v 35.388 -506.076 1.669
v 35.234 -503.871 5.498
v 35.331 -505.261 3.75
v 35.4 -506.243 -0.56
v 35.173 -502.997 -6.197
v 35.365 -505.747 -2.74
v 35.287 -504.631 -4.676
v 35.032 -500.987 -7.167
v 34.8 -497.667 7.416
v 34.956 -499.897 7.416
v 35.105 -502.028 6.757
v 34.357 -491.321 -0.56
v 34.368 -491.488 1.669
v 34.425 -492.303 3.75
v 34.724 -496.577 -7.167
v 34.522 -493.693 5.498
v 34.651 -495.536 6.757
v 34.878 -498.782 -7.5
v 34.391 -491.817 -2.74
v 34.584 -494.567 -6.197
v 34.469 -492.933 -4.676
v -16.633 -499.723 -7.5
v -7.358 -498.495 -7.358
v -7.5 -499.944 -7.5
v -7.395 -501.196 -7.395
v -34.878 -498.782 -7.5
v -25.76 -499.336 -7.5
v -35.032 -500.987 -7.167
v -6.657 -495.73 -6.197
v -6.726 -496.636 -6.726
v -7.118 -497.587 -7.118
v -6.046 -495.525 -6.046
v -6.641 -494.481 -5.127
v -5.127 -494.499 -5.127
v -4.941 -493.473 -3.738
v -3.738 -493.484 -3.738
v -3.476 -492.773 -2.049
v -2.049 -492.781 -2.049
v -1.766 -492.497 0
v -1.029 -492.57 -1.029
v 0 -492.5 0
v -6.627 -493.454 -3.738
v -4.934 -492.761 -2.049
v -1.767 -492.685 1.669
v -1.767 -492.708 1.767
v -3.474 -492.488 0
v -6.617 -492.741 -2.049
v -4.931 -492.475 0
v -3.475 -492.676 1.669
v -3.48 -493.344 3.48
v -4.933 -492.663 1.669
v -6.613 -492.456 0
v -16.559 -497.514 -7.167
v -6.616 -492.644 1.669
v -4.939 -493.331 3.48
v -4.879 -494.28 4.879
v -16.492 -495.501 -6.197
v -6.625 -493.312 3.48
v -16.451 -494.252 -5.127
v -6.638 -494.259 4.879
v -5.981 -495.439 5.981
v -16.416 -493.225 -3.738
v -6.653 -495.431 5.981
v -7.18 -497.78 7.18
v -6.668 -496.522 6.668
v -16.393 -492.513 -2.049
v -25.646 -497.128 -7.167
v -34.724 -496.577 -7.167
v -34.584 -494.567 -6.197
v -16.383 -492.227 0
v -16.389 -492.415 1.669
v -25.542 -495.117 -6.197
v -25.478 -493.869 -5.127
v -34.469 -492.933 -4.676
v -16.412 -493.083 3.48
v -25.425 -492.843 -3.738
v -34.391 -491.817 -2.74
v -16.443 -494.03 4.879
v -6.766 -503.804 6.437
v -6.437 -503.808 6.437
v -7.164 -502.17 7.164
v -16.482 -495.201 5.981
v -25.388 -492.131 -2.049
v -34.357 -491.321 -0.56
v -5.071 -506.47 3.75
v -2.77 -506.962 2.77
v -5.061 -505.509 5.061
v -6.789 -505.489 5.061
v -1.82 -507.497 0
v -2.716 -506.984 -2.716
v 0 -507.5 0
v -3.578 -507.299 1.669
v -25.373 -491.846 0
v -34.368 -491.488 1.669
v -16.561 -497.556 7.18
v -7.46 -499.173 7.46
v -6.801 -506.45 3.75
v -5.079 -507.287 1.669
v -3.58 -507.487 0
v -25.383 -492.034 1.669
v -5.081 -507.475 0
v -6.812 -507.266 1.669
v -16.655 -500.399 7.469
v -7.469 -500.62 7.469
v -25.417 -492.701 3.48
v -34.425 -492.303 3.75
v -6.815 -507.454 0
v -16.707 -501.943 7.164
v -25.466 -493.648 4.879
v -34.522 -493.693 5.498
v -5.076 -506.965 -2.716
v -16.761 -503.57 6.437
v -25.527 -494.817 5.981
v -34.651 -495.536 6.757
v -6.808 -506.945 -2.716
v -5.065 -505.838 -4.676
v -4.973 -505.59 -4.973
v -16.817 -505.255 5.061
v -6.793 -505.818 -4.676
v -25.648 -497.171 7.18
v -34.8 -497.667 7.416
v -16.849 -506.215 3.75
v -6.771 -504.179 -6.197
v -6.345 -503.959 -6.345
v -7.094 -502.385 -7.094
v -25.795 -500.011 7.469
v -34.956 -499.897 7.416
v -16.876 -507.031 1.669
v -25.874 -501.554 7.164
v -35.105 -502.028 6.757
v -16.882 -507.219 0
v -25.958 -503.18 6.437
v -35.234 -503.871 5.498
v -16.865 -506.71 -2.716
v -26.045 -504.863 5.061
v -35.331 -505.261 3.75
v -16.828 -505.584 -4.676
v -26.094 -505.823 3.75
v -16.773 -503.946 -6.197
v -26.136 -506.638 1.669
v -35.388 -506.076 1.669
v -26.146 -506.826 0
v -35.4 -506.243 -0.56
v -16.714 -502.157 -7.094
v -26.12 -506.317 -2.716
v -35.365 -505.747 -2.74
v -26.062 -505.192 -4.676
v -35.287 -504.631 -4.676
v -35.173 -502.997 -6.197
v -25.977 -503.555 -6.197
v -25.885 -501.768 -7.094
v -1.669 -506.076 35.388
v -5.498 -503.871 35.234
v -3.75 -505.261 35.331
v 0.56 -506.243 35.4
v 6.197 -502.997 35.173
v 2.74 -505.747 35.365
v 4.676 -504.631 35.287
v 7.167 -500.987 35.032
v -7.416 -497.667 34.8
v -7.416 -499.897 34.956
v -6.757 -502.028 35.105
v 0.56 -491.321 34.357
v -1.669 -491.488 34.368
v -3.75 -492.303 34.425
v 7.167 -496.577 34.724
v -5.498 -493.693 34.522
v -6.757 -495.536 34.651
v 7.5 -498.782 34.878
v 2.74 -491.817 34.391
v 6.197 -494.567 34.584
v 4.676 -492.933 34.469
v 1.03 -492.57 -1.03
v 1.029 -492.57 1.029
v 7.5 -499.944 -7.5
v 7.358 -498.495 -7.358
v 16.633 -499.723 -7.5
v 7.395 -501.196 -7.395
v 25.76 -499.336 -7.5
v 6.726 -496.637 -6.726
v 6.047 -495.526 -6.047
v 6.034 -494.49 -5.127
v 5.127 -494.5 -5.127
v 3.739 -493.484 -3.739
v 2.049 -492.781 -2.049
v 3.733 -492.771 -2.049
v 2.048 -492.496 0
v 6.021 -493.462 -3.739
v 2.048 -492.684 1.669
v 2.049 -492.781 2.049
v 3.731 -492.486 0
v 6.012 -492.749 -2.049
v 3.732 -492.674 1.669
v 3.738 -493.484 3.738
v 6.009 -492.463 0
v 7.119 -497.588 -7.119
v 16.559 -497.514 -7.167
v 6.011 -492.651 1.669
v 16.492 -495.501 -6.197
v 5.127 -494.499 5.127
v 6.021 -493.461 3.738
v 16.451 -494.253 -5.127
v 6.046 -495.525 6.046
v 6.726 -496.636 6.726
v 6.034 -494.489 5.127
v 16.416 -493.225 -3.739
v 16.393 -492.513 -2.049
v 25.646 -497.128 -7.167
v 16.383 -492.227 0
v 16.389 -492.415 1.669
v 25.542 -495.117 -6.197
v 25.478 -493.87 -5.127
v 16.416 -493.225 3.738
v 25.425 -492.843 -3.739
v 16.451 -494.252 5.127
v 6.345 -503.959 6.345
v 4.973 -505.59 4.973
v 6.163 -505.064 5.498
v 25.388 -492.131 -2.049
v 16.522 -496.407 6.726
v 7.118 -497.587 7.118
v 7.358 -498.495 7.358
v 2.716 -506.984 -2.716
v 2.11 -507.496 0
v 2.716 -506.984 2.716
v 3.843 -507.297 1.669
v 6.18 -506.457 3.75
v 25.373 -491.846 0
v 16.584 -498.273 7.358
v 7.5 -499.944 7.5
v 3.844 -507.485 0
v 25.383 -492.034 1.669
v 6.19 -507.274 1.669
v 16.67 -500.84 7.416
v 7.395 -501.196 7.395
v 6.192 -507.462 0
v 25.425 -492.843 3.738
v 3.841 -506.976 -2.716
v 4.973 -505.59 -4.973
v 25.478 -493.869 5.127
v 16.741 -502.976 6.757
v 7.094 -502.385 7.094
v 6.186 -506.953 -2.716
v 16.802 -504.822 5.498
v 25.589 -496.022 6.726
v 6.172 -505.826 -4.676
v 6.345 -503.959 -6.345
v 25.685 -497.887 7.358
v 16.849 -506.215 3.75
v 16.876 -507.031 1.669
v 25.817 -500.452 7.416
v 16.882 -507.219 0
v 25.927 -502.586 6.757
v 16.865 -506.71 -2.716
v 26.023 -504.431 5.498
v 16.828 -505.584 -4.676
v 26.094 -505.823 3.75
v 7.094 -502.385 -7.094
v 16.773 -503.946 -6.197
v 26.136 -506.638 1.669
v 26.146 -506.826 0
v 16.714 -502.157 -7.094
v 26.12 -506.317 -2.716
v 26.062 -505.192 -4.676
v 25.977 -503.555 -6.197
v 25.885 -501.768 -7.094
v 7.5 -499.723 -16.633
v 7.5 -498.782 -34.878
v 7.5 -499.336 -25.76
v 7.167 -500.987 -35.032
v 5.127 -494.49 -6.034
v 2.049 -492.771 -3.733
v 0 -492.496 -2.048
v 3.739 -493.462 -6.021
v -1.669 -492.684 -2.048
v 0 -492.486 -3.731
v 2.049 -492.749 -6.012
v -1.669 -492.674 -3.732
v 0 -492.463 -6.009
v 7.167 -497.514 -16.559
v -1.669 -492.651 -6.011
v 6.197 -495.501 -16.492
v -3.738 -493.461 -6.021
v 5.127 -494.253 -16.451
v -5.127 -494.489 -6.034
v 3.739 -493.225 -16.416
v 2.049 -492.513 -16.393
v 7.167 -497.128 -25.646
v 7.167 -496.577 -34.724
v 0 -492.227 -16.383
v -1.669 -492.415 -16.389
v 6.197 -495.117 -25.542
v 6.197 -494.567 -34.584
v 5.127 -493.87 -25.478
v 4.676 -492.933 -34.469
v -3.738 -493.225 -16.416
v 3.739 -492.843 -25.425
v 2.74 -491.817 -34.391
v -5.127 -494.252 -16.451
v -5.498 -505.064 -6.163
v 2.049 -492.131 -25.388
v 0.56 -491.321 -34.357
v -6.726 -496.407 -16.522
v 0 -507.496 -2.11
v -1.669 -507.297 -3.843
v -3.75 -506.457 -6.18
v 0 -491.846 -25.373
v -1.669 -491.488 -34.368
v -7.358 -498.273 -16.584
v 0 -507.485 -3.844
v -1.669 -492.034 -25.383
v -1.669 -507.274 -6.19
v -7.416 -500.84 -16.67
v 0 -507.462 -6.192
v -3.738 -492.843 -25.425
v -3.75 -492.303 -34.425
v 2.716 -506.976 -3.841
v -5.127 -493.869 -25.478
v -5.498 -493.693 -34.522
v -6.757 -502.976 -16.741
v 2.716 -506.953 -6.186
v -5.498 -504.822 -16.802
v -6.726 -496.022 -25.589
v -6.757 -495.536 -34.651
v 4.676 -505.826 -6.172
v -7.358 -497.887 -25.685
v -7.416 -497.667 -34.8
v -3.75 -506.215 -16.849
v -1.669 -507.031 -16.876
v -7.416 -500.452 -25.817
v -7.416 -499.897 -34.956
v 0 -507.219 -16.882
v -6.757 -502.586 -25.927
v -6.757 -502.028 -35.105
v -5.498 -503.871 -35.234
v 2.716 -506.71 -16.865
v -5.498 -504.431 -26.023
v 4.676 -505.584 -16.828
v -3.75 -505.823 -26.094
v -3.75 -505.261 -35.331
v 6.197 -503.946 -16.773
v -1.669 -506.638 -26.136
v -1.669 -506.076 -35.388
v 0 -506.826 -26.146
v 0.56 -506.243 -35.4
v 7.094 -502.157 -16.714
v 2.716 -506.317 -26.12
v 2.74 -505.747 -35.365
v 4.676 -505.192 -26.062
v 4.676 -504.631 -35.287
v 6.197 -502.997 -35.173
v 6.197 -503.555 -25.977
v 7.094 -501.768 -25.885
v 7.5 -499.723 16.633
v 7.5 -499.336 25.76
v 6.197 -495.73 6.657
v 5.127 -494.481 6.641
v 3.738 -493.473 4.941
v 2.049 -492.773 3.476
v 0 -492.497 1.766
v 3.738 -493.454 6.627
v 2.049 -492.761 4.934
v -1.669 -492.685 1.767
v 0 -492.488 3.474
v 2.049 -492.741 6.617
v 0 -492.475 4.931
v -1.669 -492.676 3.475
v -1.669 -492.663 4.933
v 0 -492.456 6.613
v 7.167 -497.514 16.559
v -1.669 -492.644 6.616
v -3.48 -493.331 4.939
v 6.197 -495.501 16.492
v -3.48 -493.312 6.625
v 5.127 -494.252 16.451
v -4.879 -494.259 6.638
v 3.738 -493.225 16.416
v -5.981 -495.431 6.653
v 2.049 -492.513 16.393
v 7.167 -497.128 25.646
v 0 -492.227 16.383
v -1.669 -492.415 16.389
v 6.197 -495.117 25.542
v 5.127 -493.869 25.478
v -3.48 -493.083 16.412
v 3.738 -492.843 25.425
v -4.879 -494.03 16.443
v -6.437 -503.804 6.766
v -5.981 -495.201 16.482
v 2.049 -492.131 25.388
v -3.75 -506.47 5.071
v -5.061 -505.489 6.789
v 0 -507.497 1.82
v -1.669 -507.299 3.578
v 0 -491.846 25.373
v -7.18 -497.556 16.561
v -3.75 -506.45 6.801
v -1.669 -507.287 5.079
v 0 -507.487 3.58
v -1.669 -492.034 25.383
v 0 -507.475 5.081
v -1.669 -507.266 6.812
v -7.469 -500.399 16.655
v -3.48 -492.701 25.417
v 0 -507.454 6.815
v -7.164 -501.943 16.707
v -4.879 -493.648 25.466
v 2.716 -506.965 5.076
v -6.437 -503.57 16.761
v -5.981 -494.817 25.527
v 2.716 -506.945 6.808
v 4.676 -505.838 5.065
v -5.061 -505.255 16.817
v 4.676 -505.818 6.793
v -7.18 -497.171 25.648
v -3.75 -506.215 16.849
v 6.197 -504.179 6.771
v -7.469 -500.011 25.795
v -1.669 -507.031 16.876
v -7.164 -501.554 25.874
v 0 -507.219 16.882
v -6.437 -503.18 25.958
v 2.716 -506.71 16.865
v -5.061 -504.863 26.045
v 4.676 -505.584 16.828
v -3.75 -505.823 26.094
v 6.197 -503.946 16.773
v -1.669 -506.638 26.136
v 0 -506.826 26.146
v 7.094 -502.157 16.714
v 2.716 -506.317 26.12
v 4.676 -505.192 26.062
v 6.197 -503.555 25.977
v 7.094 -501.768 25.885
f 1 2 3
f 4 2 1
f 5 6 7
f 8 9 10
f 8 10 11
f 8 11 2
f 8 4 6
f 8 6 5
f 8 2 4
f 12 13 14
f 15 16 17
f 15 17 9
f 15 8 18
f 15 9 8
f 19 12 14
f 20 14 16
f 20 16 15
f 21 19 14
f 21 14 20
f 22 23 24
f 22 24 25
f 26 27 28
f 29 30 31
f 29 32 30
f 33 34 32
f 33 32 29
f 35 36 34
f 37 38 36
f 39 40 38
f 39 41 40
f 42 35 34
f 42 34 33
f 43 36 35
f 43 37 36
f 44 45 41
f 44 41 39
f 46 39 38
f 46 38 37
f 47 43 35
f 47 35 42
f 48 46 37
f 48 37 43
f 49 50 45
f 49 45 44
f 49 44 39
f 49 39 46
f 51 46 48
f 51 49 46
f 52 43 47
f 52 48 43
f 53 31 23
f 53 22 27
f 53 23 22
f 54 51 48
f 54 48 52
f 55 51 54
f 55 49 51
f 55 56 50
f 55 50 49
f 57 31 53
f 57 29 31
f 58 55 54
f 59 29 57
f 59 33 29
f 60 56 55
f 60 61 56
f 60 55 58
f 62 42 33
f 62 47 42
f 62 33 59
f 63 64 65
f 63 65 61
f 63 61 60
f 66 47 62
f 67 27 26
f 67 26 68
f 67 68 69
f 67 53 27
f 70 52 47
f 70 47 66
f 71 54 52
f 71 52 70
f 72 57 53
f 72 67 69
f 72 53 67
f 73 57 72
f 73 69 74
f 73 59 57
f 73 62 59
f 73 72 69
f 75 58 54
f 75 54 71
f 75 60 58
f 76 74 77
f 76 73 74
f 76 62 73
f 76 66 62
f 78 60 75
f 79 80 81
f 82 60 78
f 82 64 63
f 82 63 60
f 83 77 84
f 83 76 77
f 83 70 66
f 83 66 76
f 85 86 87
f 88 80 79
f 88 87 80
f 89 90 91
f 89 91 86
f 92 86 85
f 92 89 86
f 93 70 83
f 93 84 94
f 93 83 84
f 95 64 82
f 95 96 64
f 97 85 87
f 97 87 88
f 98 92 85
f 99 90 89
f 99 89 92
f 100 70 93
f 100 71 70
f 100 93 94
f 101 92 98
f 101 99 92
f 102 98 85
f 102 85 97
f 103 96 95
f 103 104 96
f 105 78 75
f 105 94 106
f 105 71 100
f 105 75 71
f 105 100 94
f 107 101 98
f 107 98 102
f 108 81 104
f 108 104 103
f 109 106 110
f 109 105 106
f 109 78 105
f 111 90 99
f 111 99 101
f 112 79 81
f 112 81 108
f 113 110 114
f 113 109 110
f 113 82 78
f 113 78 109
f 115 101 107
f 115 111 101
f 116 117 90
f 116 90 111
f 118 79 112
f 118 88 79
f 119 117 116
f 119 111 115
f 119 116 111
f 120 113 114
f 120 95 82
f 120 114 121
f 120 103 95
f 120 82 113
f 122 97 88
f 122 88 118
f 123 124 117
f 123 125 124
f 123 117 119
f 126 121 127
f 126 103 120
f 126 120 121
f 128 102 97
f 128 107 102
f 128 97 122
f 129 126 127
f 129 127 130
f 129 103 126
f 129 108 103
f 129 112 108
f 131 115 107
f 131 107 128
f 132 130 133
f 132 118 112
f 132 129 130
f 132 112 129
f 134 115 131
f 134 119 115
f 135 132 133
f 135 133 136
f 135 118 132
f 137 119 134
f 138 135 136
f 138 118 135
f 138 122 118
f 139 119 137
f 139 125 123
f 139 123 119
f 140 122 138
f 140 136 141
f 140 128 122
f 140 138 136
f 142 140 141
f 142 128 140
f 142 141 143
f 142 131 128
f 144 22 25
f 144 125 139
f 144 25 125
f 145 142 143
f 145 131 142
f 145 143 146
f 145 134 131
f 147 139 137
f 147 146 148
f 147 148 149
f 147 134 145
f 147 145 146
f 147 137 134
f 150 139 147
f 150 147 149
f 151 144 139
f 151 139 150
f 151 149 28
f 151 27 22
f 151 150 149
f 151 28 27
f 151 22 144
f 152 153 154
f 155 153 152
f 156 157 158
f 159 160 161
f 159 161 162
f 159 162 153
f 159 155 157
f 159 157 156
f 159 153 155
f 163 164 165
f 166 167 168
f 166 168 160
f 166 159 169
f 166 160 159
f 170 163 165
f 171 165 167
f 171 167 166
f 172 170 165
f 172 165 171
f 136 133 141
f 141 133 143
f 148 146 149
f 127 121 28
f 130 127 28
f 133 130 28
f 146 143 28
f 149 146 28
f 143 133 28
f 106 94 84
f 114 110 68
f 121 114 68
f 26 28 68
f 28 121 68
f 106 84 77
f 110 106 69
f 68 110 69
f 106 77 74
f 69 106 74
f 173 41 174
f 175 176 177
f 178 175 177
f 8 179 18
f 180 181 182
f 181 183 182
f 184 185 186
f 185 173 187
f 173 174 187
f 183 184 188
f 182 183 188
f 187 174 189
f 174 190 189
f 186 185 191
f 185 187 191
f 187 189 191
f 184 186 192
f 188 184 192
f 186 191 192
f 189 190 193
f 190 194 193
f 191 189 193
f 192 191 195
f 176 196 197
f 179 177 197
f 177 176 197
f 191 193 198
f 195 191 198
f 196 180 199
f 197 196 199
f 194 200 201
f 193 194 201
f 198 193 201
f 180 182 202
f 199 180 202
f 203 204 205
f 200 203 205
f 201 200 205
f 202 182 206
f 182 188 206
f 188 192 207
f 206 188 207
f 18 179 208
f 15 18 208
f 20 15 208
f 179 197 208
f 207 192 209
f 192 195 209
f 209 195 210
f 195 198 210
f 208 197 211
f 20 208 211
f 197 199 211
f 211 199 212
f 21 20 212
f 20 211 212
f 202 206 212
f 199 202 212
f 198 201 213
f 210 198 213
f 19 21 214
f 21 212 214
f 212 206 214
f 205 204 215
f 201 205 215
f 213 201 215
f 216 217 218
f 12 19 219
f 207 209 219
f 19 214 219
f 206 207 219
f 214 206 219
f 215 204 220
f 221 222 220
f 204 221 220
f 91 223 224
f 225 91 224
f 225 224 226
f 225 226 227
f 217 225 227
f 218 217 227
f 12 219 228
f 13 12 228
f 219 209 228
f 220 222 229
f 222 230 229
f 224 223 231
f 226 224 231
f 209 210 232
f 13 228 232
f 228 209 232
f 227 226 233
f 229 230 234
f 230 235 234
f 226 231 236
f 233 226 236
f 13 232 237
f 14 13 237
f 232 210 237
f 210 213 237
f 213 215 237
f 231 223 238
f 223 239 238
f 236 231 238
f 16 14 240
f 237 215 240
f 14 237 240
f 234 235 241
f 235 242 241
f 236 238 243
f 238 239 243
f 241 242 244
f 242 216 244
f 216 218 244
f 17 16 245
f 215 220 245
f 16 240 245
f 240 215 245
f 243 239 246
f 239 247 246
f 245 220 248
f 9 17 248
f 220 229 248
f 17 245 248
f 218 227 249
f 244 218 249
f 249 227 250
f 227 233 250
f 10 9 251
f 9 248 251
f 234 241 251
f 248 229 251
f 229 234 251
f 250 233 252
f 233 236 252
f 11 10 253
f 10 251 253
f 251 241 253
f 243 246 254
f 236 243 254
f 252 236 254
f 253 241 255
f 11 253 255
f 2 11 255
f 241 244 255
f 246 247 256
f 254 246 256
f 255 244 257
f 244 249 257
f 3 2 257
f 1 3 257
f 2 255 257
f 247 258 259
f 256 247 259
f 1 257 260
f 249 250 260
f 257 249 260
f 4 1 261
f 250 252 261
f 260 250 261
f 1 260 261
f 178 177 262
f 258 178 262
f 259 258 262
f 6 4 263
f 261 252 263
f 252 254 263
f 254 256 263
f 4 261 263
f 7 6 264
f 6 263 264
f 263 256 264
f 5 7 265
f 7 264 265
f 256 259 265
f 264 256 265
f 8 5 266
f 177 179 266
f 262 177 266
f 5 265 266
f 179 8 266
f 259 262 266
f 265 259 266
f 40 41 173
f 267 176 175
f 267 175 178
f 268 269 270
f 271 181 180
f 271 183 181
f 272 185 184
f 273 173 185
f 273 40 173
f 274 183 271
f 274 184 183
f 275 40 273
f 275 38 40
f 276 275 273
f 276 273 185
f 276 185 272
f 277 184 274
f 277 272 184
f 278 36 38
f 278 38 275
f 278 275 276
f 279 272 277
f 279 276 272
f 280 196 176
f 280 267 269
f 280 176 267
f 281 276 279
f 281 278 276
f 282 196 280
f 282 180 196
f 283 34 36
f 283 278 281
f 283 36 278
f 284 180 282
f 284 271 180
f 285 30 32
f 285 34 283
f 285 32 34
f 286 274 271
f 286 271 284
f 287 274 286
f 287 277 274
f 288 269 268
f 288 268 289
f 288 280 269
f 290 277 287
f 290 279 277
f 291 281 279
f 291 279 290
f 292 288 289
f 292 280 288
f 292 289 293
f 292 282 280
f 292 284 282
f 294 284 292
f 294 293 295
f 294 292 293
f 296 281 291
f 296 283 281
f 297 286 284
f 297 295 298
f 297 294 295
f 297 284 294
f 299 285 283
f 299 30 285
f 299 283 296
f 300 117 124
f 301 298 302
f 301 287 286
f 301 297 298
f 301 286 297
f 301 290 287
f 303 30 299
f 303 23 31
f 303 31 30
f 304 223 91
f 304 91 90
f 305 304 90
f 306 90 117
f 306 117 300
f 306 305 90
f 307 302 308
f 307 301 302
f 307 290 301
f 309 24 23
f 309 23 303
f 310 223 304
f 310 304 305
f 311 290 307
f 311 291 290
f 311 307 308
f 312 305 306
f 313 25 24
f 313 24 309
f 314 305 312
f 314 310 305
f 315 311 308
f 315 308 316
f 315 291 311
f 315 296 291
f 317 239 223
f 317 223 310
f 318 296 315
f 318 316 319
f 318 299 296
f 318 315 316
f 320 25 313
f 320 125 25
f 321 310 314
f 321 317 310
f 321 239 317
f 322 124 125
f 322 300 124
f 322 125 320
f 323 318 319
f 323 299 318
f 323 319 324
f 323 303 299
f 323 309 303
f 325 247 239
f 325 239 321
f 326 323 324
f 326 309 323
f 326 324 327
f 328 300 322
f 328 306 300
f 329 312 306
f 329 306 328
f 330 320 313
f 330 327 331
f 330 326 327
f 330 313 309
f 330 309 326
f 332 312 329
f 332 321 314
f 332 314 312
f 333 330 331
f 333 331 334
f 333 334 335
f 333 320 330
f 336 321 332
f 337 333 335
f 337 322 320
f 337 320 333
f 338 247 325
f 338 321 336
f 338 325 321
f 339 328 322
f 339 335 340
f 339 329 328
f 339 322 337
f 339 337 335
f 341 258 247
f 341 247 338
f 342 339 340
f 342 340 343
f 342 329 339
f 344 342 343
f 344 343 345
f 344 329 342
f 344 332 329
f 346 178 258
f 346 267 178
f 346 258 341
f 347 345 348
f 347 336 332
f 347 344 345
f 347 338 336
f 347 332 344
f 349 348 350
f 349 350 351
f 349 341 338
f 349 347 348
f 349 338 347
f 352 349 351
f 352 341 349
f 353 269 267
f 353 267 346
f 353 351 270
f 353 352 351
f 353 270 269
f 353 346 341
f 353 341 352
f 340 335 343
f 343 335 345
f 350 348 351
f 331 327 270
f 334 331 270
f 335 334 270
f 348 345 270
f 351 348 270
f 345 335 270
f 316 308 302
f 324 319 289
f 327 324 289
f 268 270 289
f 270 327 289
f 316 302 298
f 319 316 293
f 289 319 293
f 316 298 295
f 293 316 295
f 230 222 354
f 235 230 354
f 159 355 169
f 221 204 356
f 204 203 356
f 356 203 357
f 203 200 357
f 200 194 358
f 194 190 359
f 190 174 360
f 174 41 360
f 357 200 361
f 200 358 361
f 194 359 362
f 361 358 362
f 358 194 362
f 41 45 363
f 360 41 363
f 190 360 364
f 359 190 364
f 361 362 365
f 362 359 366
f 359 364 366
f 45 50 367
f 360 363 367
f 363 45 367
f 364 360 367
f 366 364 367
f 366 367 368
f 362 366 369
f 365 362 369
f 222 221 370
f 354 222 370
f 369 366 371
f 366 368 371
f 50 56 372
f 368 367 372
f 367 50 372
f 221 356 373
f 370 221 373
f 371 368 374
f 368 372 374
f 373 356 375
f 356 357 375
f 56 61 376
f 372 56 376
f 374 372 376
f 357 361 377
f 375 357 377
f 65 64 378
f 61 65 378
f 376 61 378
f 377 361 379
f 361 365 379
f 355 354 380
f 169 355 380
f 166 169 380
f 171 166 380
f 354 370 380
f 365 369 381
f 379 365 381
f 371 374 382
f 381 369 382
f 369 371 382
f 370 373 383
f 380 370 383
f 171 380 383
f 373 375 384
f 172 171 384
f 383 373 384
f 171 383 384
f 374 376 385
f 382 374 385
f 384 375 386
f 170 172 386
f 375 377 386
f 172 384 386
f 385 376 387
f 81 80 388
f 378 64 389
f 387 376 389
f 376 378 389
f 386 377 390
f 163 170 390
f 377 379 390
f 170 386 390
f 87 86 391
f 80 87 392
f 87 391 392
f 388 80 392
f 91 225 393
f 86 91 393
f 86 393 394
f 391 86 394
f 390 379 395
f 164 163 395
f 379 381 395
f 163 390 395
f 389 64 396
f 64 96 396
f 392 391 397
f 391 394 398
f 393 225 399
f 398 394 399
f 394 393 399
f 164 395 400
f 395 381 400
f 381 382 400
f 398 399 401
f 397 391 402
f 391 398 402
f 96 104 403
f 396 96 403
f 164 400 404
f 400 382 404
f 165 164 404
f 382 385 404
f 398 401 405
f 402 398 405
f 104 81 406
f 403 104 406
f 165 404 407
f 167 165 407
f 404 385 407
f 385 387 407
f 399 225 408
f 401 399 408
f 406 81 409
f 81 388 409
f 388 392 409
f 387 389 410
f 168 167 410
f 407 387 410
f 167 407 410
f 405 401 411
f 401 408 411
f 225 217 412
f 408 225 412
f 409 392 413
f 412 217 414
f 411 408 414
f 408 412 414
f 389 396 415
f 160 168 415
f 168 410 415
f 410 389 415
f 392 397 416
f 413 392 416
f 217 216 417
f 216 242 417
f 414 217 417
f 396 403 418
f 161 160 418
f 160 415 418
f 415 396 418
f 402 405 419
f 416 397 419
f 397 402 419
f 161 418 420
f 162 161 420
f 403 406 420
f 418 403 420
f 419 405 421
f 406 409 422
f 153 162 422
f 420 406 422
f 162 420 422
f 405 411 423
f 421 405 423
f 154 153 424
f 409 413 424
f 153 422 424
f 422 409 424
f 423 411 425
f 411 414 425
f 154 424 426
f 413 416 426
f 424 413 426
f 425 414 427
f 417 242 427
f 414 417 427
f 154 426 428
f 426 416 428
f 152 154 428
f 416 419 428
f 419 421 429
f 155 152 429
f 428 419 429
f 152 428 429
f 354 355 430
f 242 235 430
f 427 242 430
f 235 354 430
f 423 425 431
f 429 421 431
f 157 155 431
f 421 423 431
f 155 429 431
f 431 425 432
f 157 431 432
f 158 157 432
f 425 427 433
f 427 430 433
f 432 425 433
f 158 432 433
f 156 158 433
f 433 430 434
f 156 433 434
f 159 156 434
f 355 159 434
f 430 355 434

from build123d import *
from build123d.topology import SkipClean

# Parameters (mm, degrees)
SKETCH3_R                = 7.5
REVOLVE1_ANGLE           = 4
REVOLVE1_OTHER_WAY_ANGLE = 4
SKETCH4_R                = 7.5
REVOLVE2_ANGLE           = 4
REVOLVE2_OTHER_WAY_ANGLE = 4


with BuildPart() as part:
    # Sketch3 → Revolve1 (revolve)
    with BuildSketch(Plane.XY):
        with Locations((0, -500)):
            Circle(SKETCH3_R)
    revolve(axis=Axis((8.68934, 0, 0), (-1, 0, 0)), revolution_arc=REVOLVE1_ANGLE)

    # Sketch3 → Revolve1 other way (revolve)
    with SkipClean():  # the faces are left unmerged after this step: merging them gives an invalid solid
        with BuildSketch(Plane.XY):
            with Locations((0, -500)):
                Circle(SKETCH3_R)
        revolve(axis=Axis((8.68934, 0, 0), (1, 0, 0)), revolution_arc=REVOLVE1_OTHER_WAY_ANGLE)

    # Sketch4 → Revolve2 (revolve)
    with SkipClean():  # the faces are left unmerged after this step: merging them gives an invalid solid
        with BuildSketch(Plane(origin=(0, 0, 0), x_dir=(0, 0, -1), z_dir=(1, 0, 0))):
            with Locations((0, -500)):
                Circle(SKETCH4_R)
        revolve(axis=Axis((0, 0, -38.972198277), (0, 0, 1)), revolution_arc=REVOLVE2_ANGLE)

    # Sketch4 → Revolve2 other way (revolve)
    with BuildSketch(Plane(origin=(0, 0, 0), x_dir=(0, 0, -1), z_dir=(1, 0, 0))):
        with Locations((0, -500)):
            Circle(SKETCH4_R)
    revolve(axis=Axis((0, 0, -38.972198277), (0, 0, -1)), revolution_arc=REVOLVE2_OTHER_WAY_ANGLE)


solid = part.part
